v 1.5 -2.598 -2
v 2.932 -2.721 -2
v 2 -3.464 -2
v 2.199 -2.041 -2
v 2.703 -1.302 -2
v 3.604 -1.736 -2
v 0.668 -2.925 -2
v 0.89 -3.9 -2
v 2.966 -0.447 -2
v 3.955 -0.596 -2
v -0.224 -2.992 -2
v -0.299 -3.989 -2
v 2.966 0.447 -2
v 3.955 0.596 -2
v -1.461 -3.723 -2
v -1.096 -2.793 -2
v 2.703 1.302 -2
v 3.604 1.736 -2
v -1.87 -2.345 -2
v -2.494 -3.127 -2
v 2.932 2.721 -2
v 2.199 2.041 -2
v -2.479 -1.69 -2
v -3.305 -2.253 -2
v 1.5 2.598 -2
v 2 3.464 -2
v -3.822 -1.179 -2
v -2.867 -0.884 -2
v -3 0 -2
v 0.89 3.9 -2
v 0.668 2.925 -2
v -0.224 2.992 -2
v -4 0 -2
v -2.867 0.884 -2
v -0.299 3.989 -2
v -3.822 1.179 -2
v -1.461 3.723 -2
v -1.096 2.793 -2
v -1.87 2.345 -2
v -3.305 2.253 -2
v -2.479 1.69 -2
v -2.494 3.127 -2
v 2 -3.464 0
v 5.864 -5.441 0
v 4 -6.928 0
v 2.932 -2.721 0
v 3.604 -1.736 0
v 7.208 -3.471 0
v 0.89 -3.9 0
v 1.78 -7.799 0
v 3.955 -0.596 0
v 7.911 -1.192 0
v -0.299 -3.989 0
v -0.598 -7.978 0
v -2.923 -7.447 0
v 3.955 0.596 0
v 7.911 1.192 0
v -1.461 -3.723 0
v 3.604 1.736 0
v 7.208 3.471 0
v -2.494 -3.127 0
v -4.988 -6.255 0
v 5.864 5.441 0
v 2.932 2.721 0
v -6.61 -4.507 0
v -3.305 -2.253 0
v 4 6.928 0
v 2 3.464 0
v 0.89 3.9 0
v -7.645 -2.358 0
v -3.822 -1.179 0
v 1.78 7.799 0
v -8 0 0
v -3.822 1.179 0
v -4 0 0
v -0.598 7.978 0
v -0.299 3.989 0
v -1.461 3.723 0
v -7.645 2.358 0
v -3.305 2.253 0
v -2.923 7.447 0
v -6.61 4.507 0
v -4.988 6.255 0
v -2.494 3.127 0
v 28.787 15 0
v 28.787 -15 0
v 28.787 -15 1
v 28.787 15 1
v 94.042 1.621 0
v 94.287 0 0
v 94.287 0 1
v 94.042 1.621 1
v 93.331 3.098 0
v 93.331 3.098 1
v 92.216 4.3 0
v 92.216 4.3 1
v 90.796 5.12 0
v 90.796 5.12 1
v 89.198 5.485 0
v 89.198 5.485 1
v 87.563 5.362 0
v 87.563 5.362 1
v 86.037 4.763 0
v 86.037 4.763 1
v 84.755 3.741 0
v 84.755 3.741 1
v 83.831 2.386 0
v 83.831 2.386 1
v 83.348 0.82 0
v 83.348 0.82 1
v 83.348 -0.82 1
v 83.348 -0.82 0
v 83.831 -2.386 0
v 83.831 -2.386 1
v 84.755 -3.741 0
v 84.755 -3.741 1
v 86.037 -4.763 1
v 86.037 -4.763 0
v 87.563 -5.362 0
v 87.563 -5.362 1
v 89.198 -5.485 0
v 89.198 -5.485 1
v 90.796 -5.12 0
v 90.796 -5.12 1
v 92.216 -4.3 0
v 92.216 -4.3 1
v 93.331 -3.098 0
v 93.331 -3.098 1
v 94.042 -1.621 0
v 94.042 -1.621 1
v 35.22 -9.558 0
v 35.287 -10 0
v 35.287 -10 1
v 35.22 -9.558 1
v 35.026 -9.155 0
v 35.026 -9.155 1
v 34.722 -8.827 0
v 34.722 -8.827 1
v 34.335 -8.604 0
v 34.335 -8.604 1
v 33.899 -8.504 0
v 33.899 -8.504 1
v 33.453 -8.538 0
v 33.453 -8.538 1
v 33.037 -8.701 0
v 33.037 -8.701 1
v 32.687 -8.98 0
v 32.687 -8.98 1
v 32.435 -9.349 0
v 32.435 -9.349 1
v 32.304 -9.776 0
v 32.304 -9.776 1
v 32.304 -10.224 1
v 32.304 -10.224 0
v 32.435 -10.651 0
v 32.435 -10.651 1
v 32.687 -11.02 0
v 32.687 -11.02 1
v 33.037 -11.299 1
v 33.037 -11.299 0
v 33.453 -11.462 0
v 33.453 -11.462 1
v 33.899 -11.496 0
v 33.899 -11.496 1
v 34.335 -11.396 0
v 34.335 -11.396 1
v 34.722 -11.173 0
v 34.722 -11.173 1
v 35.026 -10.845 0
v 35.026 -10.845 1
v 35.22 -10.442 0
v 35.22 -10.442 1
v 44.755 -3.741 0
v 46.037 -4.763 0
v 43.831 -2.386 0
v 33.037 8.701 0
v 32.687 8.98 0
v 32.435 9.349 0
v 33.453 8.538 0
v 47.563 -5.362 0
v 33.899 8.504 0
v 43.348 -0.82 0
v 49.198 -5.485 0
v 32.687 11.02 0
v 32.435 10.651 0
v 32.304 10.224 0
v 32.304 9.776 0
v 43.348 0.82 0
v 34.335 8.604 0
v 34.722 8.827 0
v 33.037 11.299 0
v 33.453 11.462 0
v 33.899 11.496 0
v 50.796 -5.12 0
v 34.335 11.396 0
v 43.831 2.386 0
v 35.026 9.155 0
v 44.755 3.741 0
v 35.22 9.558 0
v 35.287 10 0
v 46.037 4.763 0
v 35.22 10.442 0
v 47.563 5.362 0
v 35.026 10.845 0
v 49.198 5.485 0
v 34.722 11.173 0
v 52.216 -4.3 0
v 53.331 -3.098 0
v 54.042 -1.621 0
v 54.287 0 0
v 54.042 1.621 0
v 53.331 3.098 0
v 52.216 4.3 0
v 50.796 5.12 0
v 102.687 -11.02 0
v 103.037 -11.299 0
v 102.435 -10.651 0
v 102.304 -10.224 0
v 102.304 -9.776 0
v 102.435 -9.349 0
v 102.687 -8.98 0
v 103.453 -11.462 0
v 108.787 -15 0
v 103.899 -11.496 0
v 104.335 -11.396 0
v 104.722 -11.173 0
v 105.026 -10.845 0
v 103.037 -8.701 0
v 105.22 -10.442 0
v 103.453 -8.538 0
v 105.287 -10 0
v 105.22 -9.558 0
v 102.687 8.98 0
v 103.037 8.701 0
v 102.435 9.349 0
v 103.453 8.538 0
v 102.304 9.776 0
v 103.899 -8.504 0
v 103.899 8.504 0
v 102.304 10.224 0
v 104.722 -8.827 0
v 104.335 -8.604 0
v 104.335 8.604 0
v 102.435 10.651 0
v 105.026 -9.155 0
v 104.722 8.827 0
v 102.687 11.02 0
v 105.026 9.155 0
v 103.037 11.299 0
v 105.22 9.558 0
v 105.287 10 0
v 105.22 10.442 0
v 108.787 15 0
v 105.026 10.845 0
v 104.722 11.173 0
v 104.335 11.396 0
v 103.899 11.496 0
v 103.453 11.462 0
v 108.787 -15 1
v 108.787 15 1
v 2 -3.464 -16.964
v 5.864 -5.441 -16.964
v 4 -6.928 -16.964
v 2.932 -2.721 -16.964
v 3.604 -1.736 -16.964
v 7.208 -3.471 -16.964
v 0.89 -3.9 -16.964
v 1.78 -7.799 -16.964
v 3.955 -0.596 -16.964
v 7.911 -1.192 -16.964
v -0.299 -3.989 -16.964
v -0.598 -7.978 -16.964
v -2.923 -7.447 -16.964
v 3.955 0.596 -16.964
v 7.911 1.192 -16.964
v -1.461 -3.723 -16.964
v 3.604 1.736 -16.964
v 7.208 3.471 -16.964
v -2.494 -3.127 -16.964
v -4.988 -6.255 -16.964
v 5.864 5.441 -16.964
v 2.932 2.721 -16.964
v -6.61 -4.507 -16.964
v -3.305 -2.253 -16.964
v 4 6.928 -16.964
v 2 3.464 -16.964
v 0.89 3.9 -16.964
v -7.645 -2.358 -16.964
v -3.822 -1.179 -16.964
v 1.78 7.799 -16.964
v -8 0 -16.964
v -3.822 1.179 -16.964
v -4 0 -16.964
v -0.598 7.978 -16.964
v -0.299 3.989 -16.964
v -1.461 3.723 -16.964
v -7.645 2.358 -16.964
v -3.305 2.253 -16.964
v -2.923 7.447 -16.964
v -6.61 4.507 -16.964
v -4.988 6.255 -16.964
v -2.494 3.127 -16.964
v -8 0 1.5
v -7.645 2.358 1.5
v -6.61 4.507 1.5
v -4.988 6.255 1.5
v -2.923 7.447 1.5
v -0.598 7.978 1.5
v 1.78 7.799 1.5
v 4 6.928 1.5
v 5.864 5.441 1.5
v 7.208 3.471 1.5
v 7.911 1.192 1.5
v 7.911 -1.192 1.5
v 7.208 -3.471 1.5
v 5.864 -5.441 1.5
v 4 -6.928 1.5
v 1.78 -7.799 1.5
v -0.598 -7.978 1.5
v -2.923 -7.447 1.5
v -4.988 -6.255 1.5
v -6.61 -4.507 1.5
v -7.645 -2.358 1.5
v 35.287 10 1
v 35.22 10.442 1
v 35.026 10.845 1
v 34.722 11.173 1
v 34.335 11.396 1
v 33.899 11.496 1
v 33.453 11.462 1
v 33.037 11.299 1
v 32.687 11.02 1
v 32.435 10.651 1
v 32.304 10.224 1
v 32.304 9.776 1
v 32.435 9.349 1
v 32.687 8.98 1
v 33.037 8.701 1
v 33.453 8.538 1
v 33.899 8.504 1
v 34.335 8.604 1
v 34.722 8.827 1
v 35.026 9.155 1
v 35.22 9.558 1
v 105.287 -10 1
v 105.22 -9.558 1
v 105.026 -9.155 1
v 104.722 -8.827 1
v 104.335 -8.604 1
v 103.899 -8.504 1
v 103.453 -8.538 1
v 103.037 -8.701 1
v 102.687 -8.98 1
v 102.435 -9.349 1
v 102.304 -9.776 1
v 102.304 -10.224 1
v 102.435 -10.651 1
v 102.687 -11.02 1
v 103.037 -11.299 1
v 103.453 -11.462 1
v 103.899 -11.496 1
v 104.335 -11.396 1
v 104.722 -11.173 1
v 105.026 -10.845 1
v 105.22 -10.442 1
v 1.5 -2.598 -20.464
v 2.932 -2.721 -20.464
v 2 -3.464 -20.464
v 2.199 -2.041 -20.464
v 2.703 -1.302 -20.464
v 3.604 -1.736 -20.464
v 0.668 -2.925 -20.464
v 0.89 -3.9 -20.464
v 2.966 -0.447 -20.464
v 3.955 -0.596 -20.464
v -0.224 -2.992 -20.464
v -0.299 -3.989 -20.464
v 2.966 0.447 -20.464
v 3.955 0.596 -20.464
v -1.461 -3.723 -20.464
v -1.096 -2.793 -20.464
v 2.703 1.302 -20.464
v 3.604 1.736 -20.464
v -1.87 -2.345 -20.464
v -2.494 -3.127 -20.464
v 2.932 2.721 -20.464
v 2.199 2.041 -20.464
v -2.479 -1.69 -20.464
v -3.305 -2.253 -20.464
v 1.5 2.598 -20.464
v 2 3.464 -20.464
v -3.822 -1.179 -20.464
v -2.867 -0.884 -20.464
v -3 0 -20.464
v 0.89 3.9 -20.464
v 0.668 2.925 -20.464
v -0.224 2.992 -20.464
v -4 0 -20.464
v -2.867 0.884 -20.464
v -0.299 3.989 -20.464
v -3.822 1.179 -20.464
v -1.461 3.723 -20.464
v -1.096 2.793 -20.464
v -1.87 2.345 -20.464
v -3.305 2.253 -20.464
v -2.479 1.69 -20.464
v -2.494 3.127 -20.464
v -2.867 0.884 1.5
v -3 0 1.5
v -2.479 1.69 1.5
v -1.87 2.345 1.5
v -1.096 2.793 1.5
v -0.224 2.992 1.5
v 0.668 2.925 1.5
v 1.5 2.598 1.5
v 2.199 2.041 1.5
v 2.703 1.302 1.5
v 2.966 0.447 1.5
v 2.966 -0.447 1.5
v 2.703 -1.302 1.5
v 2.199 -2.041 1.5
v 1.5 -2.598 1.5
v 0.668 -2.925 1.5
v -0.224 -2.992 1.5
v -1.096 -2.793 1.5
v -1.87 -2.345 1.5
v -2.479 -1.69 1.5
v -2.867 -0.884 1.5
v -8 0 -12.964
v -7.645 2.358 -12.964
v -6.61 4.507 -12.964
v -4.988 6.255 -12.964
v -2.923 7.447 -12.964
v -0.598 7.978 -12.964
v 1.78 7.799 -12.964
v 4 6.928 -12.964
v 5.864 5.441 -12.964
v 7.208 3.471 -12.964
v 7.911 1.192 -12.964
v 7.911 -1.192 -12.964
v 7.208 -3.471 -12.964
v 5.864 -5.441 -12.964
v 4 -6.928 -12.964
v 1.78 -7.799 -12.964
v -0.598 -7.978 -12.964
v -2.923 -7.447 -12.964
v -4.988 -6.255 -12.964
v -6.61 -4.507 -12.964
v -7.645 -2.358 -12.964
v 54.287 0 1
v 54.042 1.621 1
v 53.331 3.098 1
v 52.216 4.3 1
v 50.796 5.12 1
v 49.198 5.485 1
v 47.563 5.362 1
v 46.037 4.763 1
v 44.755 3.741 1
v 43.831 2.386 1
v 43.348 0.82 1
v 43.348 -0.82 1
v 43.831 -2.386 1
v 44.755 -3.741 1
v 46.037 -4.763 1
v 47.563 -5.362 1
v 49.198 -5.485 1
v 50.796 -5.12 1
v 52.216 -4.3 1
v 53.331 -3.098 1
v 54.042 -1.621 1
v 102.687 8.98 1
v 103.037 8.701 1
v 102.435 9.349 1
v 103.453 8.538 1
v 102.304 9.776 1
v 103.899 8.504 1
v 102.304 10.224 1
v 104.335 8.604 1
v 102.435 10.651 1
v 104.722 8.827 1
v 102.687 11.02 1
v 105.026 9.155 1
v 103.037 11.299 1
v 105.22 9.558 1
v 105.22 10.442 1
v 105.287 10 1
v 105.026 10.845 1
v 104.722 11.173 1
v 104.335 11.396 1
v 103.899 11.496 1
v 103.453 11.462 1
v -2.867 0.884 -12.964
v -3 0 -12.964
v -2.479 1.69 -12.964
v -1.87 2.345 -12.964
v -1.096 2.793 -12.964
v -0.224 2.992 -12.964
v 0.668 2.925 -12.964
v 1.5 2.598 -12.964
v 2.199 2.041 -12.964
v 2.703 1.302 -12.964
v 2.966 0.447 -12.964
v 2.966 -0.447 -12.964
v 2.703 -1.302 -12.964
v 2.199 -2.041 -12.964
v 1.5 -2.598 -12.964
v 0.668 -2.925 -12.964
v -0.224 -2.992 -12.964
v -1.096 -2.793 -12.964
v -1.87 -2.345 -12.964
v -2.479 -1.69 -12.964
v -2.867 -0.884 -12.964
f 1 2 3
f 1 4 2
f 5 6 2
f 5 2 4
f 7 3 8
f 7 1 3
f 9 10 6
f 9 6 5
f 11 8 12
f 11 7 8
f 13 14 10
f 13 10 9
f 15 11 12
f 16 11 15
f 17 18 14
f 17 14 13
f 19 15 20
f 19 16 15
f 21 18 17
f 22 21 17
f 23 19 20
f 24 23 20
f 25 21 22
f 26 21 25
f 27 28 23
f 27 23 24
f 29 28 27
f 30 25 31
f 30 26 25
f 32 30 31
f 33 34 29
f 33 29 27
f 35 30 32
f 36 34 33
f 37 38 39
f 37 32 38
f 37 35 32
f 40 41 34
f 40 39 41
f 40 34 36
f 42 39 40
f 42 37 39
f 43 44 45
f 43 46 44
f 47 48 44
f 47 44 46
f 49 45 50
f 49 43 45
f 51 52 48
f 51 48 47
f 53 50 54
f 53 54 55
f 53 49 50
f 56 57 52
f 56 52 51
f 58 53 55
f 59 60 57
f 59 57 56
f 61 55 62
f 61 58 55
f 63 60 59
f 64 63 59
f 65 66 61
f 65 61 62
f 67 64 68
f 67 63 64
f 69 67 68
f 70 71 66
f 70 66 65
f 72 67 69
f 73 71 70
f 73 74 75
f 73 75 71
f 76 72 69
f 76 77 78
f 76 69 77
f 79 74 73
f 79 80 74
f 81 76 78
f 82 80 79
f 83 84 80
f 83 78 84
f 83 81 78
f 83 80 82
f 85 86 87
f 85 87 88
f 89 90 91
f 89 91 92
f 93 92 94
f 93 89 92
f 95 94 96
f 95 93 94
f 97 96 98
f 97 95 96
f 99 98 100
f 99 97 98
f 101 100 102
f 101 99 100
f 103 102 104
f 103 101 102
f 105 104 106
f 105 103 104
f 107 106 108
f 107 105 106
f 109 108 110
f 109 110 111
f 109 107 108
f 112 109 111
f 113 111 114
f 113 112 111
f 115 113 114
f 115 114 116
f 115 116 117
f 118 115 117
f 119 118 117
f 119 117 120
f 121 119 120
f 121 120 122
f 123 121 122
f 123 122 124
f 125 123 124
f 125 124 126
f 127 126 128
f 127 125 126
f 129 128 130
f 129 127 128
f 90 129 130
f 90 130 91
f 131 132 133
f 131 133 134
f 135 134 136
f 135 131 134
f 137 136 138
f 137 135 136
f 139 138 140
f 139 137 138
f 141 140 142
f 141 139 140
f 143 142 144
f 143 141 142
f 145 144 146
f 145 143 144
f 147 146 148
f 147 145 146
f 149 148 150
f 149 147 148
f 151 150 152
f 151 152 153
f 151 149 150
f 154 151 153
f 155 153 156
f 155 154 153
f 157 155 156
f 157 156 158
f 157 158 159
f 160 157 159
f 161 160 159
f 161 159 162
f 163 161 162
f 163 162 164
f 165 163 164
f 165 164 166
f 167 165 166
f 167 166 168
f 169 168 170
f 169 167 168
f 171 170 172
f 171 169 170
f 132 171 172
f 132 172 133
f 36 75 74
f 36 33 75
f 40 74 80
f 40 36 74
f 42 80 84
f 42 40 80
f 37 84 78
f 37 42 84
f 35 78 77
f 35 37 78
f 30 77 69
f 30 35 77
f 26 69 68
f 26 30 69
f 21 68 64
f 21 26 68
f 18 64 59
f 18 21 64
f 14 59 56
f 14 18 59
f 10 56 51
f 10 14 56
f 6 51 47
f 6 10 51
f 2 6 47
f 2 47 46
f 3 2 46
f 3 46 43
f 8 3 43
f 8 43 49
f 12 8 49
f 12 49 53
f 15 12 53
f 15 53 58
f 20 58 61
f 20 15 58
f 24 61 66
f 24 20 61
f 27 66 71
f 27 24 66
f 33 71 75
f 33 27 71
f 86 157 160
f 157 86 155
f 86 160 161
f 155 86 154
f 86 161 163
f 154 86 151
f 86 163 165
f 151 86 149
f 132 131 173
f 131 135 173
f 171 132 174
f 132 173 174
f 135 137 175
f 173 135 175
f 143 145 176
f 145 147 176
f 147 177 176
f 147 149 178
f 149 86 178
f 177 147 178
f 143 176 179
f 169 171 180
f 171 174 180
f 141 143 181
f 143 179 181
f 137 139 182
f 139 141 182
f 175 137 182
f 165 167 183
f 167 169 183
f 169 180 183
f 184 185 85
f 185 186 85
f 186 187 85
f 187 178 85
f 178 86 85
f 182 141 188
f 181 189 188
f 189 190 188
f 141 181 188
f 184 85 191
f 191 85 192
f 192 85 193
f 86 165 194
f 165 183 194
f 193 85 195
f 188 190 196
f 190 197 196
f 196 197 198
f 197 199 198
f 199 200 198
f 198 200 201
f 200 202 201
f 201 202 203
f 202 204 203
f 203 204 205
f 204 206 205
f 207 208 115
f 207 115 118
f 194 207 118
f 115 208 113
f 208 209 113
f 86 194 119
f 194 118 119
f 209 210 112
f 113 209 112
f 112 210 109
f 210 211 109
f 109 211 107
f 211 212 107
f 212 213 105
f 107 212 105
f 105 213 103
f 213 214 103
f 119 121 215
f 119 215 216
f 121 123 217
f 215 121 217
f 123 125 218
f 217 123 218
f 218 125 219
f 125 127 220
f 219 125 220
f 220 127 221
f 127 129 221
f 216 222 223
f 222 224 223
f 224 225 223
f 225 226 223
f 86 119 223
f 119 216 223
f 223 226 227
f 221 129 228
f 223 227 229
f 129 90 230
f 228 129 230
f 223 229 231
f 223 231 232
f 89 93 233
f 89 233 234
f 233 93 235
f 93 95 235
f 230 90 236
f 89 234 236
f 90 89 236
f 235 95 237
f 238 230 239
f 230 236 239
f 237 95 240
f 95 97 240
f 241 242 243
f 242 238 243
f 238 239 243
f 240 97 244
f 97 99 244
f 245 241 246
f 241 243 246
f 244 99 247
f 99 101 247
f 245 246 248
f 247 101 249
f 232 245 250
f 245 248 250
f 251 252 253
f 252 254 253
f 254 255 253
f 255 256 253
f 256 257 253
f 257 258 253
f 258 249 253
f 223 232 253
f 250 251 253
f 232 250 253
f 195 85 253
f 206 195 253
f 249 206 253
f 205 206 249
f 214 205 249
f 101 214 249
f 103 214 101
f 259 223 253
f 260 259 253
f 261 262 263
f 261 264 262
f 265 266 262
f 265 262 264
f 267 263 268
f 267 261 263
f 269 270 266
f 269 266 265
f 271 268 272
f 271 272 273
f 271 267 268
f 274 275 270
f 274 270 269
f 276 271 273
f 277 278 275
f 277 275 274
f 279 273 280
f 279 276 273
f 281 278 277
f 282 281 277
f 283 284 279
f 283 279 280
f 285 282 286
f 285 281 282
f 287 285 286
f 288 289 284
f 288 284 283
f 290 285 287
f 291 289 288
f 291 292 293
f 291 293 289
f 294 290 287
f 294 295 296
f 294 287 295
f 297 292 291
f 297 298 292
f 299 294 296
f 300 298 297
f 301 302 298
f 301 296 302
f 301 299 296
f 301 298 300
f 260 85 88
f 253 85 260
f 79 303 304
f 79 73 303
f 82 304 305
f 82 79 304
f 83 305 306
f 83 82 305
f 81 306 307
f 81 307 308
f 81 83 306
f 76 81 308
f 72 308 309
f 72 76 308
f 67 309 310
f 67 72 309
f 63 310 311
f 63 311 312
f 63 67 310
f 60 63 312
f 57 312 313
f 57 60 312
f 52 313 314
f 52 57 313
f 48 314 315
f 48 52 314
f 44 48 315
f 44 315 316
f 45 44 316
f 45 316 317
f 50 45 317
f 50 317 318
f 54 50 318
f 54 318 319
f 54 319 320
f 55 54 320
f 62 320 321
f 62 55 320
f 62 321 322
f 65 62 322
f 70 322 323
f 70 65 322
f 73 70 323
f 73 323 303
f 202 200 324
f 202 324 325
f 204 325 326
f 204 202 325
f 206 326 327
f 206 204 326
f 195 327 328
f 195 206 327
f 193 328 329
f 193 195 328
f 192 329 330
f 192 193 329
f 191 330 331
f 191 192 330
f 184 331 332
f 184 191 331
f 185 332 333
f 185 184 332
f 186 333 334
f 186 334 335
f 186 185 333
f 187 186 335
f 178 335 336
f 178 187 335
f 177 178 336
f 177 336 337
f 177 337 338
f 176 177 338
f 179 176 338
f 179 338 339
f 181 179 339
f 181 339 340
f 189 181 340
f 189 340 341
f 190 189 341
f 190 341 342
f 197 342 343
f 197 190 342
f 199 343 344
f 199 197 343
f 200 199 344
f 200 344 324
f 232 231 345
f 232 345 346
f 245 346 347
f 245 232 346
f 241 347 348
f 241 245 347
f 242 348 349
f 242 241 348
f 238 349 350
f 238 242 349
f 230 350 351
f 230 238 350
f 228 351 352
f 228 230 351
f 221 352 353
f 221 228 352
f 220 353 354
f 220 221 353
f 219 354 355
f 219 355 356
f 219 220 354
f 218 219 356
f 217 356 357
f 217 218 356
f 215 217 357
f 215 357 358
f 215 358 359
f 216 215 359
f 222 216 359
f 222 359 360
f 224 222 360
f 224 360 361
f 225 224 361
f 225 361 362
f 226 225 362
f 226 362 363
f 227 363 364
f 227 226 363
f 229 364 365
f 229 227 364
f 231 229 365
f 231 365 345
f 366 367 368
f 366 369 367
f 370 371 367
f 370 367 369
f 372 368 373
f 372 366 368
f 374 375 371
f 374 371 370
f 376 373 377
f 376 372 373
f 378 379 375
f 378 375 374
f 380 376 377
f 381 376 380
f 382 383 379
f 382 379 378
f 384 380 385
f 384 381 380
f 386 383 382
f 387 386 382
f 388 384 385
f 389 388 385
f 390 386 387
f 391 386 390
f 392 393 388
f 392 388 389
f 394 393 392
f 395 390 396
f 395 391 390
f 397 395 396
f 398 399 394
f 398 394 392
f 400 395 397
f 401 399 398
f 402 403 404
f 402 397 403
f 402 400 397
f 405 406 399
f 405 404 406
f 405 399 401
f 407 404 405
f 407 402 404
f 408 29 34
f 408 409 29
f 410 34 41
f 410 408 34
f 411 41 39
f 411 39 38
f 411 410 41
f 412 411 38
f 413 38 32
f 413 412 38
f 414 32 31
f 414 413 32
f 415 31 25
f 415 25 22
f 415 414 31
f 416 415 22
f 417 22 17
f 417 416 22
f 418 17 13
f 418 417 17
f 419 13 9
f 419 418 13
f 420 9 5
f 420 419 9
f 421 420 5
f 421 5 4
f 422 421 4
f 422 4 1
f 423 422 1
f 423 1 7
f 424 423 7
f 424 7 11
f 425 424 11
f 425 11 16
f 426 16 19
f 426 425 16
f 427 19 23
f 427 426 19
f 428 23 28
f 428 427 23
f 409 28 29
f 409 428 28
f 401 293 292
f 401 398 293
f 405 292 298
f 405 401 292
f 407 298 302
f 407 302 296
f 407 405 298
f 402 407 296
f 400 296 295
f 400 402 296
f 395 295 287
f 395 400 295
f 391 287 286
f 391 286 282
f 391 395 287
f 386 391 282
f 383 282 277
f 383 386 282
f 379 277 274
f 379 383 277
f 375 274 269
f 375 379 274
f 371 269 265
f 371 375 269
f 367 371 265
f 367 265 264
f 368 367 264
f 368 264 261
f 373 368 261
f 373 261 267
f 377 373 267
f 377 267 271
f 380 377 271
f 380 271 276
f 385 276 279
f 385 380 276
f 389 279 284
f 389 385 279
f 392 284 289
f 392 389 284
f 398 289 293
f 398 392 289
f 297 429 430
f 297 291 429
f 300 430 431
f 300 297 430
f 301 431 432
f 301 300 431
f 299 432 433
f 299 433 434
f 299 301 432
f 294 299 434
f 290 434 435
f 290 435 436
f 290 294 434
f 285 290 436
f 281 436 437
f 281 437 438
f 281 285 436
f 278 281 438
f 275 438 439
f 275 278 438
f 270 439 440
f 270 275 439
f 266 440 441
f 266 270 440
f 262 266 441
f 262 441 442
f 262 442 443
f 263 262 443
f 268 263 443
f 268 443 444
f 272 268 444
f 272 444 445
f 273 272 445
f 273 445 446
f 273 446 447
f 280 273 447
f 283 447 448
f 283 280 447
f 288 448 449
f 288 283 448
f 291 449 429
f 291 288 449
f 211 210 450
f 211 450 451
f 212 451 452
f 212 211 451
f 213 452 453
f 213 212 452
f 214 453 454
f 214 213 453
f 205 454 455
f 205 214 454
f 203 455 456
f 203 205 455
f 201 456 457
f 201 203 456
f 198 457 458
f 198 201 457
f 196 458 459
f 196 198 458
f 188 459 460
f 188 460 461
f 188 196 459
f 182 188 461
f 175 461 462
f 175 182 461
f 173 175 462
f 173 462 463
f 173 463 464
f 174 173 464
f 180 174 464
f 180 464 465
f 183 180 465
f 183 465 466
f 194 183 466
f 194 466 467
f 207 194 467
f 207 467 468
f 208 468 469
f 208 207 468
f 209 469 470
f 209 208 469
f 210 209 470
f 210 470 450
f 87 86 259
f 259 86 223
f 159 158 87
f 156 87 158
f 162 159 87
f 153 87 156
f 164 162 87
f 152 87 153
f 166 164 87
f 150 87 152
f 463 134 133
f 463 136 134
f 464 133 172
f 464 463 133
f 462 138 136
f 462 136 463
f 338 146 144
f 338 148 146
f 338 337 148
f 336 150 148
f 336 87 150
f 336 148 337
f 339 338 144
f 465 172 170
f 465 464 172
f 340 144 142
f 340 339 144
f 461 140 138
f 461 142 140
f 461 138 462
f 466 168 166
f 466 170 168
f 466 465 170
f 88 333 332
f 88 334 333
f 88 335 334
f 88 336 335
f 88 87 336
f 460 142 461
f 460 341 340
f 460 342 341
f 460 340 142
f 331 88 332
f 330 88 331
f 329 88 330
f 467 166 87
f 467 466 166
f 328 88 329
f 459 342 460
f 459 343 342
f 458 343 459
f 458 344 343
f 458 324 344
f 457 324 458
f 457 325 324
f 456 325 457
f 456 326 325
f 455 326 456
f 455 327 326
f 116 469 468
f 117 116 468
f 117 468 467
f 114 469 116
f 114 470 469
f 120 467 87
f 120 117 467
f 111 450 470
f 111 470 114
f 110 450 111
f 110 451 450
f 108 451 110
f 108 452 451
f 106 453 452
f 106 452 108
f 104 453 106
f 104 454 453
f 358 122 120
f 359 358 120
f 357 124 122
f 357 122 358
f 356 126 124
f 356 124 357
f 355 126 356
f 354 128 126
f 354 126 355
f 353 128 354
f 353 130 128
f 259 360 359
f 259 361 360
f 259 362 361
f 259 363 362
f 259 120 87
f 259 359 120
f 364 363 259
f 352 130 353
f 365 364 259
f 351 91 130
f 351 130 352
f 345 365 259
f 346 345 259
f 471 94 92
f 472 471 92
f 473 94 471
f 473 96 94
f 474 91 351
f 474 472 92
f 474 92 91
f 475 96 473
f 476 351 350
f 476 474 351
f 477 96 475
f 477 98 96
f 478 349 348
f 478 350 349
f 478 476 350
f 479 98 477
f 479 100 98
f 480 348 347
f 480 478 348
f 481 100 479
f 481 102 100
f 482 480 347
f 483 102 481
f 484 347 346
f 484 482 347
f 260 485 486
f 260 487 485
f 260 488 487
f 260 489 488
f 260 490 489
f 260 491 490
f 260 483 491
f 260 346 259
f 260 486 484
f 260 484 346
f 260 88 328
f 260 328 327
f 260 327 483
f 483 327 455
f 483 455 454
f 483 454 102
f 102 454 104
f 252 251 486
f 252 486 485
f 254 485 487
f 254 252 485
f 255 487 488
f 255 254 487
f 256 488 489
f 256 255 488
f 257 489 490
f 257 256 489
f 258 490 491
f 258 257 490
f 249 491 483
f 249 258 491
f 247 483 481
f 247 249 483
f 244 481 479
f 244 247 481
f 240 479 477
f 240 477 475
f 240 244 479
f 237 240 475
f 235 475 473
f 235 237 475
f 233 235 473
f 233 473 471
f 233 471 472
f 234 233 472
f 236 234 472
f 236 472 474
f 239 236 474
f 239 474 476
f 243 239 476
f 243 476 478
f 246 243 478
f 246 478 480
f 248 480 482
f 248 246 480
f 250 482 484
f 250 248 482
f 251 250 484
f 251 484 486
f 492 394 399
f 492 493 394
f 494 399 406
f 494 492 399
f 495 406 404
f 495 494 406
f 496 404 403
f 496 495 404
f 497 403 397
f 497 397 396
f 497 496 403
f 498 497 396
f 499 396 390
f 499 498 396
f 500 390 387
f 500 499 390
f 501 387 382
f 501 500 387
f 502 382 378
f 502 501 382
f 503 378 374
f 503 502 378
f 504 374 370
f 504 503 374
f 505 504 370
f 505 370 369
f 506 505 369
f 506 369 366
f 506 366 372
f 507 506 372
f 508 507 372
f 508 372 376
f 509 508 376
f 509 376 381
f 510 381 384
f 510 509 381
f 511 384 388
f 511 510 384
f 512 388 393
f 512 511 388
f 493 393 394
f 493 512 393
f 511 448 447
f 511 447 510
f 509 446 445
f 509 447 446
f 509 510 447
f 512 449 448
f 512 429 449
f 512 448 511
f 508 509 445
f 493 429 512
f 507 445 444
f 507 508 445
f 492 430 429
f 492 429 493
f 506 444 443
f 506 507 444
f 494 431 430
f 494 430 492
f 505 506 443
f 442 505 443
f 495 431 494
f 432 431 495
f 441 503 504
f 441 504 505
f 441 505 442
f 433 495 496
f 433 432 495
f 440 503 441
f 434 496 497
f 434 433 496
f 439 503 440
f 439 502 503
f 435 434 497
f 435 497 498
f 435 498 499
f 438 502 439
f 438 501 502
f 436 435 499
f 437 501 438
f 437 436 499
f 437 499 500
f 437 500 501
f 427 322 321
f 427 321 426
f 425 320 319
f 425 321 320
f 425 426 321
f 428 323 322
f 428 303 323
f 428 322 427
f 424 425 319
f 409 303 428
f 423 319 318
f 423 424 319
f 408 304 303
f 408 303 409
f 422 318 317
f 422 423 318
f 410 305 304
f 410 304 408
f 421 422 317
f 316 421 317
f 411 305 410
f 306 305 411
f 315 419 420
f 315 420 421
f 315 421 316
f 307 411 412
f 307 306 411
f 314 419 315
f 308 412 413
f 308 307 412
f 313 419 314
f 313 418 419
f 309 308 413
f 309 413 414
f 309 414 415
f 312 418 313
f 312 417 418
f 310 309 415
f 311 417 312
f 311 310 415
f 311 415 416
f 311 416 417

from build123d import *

# Parameters (mm, degrees)
F2_W     = 80
F2_H     = 30
F2_R     = 1.5
F2_R_2   = 5.5
F3_DEPTH = 1


with BuildPart() as f1:
    # F0 (on Front) → F1 (revolve)
    with BuildSketch(Plane.XZ):
        Polygon((-3, -2), (-3, 1.5), (-8, 1.5), (-8, 0), (-4, 0), (-4, -2), align=None)
    revolve(axis=Axis((0, 0, 2.077047), (0, 0, -1)))


with BuildPart() as f3:
    # F2 (on Top) → F3 (new body)
    with BuildSketch(Plane.XY):
        with Locations((68.786818, 0)):
            Rectangle(F2_W, F2_H)
        with Locations((33.786818, -10)):
            Circle(F2_R, mode=Mode.SUBTRACT)
        with Locations((103.786818, -10)):
            Circle(F2_R, mode=Mode.SUBTRACT)
        with Locations((48.786818, 0)):
            Circle(F2_R_2, mode=Mode.SUBTRACT)
        with Locations((33.786818, 10)):
            Circle(F2_R, mode=Mode.SUBTRACT)
        with Locations((88.786818, 0)):
            Circle(F2_R_2, mode=Mode.SUBTRACT)
        with Locations((103.786818, 10)):
            Circle(F2_R, mode=Mode.SUBTRACT)
    extrude(amount=F3_DEPTH)


with BuildPart() as f5:
    # F4 (on Front) → F5 (revolve)
    with BuildSketch(Plane.XZ):
        Polygon((-3, -20.464356), (-3, -12.964356), (-8, -12.964356), (-8, -16.964356), (-4, -16.964356), (-4, -20.464356), align=None)
    revolve(axis=Axis((0, 0, -17.545227), (0, 0, -1)))


solid = Compound([f1.part, f3.part, f5.part])
